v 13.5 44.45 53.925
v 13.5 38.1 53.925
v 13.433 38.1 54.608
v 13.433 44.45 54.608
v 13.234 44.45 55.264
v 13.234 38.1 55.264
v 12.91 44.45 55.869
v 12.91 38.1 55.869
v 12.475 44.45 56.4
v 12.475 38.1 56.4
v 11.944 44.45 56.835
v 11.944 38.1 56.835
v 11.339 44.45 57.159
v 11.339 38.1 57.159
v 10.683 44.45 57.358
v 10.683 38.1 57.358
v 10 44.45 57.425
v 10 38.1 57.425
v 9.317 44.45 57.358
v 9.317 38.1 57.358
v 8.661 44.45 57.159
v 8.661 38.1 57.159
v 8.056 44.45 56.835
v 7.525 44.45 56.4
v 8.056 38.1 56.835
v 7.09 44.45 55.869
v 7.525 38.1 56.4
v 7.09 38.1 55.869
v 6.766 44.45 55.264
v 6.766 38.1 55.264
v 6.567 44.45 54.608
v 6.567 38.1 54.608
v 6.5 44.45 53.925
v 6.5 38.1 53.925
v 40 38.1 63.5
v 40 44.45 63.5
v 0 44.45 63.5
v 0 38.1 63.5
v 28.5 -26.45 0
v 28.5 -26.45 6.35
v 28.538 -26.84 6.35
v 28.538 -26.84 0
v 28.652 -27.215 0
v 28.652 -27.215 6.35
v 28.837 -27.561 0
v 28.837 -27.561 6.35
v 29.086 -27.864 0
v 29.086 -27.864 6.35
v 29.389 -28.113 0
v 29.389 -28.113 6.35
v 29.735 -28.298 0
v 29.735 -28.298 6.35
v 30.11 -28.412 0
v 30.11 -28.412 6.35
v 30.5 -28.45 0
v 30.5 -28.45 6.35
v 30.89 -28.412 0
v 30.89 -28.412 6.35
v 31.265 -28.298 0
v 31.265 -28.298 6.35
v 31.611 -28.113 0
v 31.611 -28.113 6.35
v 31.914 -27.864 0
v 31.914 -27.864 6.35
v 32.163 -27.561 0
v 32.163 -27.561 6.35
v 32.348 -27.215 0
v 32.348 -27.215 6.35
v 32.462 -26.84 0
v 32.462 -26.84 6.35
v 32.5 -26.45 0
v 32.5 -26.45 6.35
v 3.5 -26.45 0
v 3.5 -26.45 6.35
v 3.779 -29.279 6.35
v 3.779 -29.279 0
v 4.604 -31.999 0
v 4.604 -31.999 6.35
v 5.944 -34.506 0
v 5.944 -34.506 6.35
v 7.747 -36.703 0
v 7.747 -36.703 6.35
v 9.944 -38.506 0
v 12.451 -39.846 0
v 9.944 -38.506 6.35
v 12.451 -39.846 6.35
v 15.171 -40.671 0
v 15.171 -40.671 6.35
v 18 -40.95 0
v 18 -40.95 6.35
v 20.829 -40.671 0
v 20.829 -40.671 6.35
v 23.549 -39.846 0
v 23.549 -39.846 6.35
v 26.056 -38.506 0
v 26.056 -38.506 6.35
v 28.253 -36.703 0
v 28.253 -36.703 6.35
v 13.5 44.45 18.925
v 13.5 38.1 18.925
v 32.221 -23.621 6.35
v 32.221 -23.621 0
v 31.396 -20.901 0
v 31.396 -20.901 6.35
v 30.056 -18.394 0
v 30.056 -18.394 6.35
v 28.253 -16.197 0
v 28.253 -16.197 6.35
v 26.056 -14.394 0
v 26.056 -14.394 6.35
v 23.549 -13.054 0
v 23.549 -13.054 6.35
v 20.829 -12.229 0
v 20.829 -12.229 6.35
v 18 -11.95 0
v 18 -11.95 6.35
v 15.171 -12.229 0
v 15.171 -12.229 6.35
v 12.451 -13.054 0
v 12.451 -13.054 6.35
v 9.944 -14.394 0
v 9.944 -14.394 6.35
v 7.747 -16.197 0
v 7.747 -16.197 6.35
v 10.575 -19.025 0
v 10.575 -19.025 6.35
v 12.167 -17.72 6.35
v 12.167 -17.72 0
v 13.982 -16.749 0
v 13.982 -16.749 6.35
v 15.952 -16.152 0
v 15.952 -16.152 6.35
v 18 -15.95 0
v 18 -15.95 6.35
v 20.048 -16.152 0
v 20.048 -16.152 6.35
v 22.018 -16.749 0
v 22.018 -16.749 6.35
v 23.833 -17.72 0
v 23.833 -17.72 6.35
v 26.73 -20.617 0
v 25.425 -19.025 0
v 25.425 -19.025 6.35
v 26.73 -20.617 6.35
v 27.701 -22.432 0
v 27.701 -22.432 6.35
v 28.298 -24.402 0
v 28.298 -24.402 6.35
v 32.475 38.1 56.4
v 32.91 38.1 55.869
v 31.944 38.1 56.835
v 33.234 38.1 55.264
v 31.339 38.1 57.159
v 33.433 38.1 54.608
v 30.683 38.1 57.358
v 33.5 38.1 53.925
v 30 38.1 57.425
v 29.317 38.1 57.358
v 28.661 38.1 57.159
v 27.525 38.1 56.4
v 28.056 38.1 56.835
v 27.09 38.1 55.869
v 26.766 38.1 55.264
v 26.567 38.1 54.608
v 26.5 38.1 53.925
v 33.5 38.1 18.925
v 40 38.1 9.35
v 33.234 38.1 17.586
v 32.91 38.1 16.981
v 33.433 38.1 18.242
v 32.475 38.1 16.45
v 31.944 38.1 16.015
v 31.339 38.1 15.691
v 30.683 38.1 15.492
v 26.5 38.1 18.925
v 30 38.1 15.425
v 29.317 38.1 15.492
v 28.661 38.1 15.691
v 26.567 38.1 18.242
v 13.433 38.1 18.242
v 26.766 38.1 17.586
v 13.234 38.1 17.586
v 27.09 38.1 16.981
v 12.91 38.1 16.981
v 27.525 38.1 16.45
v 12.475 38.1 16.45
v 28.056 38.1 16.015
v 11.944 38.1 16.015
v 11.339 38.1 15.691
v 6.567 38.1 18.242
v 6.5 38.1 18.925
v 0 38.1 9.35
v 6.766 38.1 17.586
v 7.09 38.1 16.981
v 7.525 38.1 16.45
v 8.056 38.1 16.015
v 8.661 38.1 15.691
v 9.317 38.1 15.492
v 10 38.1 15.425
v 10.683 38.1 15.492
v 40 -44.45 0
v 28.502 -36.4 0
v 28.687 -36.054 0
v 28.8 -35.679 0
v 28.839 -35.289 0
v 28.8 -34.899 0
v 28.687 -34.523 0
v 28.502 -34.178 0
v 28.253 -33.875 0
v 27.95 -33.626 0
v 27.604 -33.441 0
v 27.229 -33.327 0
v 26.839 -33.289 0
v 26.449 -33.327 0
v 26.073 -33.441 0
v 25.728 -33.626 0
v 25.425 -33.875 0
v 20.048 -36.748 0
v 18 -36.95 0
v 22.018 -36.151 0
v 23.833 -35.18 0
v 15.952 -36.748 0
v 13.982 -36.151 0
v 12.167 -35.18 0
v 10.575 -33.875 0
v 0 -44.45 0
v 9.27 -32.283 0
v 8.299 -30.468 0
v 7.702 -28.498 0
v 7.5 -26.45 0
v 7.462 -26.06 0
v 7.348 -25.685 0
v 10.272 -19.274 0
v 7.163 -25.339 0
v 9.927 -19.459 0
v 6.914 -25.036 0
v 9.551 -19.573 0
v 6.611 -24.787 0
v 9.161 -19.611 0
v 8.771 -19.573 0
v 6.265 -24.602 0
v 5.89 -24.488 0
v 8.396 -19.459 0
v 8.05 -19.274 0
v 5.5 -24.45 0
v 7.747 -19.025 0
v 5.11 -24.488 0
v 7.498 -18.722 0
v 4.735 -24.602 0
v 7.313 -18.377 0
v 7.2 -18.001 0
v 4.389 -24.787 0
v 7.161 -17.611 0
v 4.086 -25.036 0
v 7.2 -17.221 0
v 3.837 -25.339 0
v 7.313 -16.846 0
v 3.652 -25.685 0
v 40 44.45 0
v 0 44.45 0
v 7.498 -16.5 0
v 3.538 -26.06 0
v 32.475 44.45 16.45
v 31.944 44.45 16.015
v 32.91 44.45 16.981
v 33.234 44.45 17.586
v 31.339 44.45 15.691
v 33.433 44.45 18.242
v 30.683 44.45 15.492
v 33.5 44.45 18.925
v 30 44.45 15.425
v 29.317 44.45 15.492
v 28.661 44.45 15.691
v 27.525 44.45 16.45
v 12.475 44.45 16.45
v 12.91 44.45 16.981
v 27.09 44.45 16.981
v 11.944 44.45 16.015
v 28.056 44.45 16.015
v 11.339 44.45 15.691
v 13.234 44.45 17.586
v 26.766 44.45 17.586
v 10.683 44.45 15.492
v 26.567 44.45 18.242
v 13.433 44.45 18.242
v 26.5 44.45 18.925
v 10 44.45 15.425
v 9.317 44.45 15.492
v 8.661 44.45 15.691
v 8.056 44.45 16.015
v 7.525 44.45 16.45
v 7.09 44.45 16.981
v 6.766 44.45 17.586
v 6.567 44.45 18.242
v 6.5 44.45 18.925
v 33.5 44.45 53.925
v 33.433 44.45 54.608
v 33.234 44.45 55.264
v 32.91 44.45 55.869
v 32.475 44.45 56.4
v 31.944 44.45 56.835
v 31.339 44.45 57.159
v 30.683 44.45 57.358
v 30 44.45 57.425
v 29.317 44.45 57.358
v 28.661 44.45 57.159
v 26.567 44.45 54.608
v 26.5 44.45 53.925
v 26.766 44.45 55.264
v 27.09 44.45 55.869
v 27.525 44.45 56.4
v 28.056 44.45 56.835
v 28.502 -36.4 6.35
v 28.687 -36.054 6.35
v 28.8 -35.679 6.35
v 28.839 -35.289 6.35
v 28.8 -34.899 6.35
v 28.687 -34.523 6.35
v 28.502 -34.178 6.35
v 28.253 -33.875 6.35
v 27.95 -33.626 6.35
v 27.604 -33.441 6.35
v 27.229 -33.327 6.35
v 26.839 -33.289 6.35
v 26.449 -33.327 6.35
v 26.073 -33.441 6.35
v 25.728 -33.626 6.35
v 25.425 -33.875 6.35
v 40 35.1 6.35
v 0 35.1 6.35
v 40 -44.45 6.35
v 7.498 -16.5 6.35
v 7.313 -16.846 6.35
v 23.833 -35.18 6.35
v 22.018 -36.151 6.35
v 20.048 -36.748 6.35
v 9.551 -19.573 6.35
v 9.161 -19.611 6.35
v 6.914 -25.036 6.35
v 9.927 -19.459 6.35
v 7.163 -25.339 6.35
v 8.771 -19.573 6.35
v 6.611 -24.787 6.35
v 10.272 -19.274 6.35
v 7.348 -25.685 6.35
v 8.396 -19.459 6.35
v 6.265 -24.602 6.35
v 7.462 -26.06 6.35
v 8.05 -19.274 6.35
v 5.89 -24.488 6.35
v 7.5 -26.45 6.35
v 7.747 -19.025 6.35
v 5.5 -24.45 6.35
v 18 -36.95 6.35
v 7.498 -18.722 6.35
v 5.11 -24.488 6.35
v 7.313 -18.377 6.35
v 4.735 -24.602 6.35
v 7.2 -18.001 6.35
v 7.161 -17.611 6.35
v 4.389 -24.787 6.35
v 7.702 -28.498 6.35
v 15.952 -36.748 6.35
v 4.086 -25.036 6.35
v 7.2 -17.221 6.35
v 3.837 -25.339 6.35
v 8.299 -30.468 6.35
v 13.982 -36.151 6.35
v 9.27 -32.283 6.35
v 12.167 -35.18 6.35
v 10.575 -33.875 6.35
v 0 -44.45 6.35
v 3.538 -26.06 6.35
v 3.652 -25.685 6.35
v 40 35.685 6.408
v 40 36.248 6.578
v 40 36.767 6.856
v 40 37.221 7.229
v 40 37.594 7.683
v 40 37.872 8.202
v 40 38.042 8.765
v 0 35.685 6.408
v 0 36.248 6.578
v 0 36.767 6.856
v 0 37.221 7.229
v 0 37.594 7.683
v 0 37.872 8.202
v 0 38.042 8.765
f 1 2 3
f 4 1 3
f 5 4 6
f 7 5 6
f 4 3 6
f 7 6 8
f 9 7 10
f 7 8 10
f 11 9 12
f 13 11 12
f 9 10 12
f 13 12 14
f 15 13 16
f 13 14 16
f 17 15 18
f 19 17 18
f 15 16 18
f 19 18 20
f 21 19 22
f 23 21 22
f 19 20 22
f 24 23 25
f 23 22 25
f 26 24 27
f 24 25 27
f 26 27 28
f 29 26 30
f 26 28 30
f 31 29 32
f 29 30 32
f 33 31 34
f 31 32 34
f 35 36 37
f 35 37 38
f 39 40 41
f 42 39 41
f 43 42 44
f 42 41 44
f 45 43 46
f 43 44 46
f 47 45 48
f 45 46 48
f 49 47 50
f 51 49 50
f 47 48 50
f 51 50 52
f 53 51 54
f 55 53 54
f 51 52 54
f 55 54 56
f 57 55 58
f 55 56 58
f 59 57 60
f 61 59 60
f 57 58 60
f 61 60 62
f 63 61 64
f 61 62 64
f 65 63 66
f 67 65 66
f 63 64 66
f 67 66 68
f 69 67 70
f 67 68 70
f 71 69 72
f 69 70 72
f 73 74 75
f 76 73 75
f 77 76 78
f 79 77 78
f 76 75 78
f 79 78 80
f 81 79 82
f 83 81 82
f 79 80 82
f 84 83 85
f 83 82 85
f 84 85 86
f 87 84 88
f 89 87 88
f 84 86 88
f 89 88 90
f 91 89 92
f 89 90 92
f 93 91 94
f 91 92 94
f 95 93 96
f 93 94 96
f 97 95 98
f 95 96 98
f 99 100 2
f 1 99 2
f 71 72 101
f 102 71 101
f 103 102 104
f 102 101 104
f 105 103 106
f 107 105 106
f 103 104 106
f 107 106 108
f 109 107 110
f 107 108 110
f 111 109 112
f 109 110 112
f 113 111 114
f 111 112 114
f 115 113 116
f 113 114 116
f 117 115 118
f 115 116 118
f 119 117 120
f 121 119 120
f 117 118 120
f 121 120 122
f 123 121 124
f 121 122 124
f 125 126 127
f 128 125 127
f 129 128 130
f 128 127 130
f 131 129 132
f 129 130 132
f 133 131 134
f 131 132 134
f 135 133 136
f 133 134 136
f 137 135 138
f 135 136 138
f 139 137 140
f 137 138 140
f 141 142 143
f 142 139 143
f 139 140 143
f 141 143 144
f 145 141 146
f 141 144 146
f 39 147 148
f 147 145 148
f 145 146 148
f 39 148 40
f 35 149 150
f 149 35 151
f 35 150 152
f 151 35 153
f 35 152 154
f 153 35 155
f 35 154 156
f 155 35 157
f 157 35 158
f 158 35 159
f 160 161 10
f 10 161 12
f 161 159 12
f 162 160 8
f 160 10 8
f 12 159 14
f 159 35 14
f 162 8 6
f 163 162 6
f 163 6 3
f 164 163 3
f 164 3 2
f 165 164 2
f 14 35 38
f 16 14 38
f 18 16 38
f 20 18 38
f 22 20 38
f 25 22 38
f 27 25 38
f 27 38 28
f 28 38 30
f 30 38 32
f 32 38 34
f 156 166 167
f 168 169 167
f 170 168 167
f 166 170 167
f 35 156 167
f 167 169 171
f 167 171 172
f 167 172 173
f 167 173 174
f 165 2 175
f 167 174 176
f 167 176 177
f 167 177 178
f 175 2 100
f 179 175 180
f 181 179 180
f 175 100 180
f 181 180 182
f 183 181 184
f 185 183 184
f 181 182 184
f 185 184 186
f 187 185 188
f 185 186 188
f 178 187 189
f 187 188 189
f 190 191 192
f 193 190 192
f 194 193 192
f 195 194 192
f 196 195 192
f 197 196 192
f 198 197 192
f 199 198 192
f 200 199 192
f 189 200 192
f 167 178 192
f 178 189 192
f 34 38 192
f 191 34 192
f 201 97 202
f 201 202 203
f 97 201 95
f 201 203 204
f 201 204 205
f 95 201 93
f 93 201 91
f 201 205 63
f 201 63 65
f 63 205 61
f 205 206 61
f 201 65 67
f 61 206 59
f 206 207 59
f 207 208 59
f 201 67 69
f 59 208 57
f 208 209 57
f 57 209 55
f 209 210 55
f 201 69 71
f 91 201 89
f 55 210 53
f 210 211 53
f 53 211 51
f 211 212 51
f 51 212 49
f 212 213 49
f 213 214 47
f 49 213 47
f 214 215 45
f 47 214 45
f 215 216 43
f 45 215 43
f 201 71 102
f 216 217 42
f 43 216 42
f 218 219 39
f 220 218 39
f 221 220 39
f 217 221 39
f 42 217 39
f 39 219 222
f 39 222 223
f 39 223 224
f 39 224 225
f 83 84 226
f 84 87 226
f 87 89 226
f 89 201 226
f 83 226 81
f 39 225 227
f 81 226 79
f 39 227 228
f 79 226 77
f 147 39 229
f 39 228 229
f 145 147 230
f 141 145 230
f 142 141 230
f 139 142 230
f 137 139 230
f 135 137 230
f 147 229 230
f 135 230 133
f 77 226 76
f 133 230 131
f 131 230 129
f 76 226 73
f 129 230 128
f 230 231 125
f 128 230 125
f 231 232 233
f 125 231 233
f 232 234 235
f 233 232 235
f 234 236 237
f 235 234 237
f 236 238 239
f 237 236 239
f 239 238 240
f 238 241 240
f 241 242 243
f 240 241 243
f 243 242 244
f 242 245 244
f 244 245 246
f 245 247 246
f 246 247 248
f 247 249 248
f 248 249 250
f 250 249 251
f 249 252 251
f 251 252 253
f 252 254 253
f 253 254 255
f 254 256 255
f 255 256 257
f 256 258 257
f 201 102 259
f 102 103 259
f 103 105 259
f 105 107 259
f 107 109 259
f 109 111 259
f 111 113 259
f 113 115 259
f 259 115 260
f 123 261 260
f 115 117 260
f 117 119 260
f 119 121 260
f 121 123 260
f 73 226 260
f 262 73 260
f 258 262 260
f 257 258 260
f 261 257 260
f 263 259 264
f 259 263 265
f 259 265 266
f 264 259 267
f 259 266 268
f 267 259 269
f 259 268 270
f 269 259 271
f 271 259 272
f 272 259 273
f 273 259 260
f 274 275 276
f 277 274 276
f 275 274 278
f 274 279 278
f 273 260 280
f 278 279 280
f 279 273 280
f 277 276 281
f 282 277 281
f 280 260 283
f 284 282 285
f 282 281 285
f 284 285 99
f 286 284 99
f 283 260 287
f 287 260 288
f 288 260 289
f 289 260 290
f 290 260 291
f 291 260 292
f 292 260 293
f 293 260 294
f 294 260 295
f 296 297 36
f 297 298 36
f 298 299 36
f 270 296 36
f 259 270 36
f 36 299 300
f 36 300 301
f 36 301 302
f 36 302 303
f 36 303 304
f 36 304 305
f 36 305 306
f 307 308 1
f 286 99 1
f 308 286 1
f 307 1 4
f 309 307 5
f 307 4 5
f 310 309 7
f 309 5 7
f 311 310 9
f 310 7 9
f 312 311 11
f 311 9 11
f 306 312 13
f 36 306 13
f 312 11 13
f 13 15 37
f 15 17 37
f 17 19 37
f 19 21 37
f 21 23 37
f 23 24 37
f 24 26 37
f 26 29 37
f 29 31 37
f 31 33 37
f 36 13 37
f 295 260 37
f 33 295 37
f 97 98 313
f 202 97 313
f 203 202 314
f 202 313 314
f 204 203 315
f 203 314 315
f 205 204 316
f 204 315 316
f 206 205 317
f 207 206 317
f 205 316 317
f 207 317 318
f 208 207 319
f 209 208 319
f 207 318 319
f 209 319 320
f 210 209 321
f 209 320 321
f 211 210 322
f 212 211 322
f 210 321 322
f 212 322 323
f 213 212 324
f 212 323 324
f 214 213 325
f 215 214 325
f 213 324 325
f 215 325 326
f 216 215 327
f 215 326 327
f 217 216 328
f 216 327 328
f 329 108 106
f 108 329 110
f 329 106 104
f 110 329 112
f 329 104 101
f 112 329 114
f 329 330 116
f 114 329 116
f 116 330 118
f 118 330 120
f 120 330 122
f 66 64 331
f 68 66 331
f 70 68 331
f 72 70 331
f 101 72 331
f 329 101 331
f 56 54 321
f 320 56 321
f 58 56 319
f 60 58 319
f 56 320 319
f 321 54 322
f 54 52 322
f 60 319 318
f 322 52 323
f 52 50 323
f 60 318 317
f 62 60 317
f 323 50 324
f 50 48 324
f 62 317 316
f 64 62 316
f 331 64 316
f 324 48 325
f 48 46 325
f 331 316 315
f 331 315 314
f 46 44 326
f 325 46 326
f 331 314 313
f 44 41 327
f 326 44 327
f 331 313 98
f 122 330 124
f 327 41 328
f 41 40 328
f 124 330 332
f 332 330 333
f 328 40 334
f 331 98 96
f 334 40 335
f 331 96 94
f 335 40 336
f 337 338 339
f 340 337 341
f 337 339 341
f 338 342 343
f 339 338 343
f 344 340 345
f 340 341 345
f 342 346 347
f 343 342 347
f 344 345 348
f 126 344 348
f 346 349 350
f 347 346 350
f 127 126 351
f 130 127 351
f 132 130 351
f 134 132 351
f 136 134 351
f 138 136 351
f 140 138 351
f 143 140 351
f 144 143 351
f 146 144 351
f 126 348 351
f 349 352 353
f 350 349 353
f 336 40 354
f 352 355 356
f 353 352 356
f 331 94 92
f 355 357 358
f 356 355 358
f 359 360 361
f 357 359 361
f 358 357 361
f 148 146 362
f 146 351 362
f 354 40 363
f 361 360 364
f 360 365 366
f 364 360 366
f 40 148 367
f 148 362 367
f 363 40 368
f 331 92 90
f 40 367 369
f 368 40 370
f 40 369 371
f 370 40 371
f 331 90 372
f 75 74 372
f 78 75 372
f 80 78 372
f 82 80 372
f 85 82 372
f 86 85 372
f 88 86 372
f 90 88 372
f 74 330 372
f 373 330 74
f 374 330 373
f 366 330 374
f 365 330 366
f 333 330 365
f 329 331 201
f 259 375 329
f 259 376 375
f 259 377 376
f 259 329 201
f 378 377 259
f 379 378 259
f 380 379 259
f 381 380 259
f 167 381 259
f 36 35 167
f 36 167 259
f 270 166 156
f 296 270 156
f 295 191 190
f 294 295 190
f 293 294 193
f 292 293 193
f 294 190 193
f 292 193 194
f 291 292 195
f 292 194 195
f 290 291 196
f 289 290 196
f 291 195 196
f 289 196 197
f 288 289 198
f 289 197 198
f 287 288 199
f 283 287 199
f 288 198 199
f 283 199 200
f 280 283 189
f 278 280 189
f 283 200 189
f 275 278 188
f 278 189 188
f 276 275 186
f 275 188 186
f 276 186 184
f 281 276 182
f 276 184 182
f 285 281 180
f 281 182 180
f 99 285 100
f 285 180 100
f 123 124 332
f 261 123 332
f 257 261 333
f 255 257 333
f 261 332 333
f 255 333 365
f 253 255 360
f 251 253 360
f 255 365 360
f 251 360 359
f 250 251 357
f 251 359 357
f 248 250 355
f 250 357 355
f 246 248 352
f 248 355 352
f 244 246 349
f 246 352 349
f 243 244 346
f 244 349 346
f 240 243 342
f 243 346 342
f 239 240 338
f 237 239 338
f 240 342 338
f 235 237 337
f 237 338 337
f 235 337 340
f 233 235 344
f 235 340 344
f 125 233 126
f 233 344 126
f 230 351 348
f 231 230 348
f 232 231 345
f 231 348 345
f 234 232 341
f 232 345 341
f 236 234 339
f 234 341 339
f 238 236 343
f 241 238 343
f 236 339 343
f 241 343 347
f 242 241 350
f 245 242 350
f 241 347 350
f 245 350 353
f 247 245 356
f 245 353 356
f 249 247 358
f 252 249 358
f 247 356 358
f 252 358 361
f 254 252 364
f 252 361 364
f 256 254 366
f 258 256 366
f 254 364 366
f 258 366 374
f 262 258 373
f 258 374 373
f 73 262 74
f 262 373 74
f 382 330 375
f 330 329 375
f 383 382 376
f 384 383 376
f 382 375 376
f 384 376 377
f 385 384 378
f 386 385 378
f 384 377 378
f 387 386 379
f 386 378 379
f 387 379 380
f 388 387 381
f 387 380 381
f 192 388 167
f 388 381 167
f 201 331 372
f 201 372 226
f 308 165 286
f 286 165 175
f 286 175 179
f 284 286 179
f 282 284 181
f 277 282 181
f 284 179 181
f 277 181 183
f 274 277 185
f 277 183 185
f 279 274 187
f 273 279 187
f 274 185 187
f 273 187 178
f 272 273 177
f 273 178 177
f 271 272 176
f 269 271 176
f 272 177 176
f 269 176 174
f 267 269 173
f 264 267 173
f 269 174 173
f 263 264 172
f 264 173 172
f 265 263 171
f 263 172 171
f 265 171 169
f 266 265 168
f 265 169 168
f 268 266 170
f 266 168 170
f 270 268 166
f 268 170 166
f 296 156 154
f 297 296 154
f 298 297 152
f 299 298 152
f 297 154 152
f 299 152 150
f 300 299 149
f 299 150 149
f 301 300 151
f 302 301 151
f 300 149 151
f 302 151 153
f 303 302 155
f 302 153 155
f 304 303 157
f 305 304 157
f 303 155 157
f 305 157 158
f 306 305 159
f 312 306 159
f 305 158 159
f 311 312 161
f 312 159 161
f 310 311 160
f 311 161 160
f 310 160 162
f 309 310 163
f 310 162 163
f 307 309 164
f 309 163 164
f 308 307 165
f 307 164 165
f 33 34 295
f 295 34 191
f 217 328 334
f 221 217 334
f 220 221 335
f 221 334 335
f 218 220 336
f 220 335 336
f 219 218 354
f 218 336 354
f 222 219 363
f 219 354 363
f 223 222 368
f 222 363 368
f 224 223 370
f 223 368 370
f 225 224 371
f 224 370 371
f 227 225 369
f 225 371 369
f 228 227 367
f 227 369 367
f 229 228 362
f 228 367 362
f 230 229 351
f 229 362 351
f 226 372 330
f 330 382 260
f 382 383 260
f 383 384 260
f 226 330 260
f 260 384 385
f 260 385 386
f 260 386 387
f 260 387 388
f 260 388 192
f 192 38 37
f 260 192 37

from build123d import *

# Parameters (mm, degrees)
F1_DEPTH = 40
F3_DEPTH = 25
F4_R     = 3
F6_DEPTH = 25


with BuildPart() as f1:
    # F0 (on Right) → F1 (new body)
    with BuildSketch(Plane.YZ):
        Polygon((-44.45, 6.35), (-44.45, 0), (44.45, 0), (44.45, 63.5), (38.1, 63.5), (38.1, 6.35), align=None)
    extrude(amount=F1_DEPTH)

    # F2 (on face) → F3 (cut)
    with BuildSketch(Plane.XY.offset(6.35)):
        with BuildLine():
            ThreePointArc((7.5, -26.45), (5.5, -24.45), (3.5, -26.45))
            ThreePointArc((3.5, -26.45), (12.4510902307, -39.8462532214), (28.2530483272, -36.7030483272))
            ThreePointArc((28.2530483272, -36.7030483272), (28.2530483272, -33.8746212025), (25.4246212025, -33.8746212025))
            ThreePointArc((25.4246212025, -33.8746212025), (13.9818239602, -36.1507350914), (7.5, -26.45))
        make_face()
        with BuildLine():
            ThreePointArc((28.5, -26.45), (30.5, -28.45), (32.5, -26.45))
            ThreePointArc((32.5, -26.45), (23.5489097693, -13.0537467786), (7.7469516728, -16.1969516728))
            ThreePointArc((7.7469516728, -16.1969516728), (7.7469516728, -19.0253787975), (10.5753787975, -19.0253787975))
            ThreePointArc((10.5753787975, -19.0253787975), (22.0181760398, -16.7492649086), (28.5, -26.45))
        make_face()
    extrude(amount=-F3_DEPTH, mode=Mode.SUBTRACT)

    # F4
    f4_edges = [f1.edges().sort_by_distance(p)[0] for p in [
        (20, 38.1, 6.35),
    ]]
    fillet(f4_edges, radius=F4_R)

    # F5 (on face) → F6 (cut)
    with BuildSketch(Plane.XZ.offset(-38.1)):
        with BuildLine():
            ThreePointArc((13.5, 53.925), (10, 57.425), (6.5, 53.925))
            Line((6.5, 53.925), (6.5, 18.925))
            ThreePointArc((6.5, 18.925), (10, 15.425), (13.5, 18.925))
            Line((13.5, 18.925), (13.5, 53.925))
        make_face()
        with BuildLine():
            ThreePointArc((33.5, 53.925), (30, 57.425), (26.5, 53.925))
            Line((26.5, 53.925), (26.5, 18.925))
            ThreePointArc((26.5, 18.925), (30, 15.425), (33.5, 18.925))
            Line((33.5, 18.925), (33.5, 53.925))
        make_face()
    extrude(amount=-F6_DEPTH, mode=Mode.SUBTRACT)


solid = f1.part
